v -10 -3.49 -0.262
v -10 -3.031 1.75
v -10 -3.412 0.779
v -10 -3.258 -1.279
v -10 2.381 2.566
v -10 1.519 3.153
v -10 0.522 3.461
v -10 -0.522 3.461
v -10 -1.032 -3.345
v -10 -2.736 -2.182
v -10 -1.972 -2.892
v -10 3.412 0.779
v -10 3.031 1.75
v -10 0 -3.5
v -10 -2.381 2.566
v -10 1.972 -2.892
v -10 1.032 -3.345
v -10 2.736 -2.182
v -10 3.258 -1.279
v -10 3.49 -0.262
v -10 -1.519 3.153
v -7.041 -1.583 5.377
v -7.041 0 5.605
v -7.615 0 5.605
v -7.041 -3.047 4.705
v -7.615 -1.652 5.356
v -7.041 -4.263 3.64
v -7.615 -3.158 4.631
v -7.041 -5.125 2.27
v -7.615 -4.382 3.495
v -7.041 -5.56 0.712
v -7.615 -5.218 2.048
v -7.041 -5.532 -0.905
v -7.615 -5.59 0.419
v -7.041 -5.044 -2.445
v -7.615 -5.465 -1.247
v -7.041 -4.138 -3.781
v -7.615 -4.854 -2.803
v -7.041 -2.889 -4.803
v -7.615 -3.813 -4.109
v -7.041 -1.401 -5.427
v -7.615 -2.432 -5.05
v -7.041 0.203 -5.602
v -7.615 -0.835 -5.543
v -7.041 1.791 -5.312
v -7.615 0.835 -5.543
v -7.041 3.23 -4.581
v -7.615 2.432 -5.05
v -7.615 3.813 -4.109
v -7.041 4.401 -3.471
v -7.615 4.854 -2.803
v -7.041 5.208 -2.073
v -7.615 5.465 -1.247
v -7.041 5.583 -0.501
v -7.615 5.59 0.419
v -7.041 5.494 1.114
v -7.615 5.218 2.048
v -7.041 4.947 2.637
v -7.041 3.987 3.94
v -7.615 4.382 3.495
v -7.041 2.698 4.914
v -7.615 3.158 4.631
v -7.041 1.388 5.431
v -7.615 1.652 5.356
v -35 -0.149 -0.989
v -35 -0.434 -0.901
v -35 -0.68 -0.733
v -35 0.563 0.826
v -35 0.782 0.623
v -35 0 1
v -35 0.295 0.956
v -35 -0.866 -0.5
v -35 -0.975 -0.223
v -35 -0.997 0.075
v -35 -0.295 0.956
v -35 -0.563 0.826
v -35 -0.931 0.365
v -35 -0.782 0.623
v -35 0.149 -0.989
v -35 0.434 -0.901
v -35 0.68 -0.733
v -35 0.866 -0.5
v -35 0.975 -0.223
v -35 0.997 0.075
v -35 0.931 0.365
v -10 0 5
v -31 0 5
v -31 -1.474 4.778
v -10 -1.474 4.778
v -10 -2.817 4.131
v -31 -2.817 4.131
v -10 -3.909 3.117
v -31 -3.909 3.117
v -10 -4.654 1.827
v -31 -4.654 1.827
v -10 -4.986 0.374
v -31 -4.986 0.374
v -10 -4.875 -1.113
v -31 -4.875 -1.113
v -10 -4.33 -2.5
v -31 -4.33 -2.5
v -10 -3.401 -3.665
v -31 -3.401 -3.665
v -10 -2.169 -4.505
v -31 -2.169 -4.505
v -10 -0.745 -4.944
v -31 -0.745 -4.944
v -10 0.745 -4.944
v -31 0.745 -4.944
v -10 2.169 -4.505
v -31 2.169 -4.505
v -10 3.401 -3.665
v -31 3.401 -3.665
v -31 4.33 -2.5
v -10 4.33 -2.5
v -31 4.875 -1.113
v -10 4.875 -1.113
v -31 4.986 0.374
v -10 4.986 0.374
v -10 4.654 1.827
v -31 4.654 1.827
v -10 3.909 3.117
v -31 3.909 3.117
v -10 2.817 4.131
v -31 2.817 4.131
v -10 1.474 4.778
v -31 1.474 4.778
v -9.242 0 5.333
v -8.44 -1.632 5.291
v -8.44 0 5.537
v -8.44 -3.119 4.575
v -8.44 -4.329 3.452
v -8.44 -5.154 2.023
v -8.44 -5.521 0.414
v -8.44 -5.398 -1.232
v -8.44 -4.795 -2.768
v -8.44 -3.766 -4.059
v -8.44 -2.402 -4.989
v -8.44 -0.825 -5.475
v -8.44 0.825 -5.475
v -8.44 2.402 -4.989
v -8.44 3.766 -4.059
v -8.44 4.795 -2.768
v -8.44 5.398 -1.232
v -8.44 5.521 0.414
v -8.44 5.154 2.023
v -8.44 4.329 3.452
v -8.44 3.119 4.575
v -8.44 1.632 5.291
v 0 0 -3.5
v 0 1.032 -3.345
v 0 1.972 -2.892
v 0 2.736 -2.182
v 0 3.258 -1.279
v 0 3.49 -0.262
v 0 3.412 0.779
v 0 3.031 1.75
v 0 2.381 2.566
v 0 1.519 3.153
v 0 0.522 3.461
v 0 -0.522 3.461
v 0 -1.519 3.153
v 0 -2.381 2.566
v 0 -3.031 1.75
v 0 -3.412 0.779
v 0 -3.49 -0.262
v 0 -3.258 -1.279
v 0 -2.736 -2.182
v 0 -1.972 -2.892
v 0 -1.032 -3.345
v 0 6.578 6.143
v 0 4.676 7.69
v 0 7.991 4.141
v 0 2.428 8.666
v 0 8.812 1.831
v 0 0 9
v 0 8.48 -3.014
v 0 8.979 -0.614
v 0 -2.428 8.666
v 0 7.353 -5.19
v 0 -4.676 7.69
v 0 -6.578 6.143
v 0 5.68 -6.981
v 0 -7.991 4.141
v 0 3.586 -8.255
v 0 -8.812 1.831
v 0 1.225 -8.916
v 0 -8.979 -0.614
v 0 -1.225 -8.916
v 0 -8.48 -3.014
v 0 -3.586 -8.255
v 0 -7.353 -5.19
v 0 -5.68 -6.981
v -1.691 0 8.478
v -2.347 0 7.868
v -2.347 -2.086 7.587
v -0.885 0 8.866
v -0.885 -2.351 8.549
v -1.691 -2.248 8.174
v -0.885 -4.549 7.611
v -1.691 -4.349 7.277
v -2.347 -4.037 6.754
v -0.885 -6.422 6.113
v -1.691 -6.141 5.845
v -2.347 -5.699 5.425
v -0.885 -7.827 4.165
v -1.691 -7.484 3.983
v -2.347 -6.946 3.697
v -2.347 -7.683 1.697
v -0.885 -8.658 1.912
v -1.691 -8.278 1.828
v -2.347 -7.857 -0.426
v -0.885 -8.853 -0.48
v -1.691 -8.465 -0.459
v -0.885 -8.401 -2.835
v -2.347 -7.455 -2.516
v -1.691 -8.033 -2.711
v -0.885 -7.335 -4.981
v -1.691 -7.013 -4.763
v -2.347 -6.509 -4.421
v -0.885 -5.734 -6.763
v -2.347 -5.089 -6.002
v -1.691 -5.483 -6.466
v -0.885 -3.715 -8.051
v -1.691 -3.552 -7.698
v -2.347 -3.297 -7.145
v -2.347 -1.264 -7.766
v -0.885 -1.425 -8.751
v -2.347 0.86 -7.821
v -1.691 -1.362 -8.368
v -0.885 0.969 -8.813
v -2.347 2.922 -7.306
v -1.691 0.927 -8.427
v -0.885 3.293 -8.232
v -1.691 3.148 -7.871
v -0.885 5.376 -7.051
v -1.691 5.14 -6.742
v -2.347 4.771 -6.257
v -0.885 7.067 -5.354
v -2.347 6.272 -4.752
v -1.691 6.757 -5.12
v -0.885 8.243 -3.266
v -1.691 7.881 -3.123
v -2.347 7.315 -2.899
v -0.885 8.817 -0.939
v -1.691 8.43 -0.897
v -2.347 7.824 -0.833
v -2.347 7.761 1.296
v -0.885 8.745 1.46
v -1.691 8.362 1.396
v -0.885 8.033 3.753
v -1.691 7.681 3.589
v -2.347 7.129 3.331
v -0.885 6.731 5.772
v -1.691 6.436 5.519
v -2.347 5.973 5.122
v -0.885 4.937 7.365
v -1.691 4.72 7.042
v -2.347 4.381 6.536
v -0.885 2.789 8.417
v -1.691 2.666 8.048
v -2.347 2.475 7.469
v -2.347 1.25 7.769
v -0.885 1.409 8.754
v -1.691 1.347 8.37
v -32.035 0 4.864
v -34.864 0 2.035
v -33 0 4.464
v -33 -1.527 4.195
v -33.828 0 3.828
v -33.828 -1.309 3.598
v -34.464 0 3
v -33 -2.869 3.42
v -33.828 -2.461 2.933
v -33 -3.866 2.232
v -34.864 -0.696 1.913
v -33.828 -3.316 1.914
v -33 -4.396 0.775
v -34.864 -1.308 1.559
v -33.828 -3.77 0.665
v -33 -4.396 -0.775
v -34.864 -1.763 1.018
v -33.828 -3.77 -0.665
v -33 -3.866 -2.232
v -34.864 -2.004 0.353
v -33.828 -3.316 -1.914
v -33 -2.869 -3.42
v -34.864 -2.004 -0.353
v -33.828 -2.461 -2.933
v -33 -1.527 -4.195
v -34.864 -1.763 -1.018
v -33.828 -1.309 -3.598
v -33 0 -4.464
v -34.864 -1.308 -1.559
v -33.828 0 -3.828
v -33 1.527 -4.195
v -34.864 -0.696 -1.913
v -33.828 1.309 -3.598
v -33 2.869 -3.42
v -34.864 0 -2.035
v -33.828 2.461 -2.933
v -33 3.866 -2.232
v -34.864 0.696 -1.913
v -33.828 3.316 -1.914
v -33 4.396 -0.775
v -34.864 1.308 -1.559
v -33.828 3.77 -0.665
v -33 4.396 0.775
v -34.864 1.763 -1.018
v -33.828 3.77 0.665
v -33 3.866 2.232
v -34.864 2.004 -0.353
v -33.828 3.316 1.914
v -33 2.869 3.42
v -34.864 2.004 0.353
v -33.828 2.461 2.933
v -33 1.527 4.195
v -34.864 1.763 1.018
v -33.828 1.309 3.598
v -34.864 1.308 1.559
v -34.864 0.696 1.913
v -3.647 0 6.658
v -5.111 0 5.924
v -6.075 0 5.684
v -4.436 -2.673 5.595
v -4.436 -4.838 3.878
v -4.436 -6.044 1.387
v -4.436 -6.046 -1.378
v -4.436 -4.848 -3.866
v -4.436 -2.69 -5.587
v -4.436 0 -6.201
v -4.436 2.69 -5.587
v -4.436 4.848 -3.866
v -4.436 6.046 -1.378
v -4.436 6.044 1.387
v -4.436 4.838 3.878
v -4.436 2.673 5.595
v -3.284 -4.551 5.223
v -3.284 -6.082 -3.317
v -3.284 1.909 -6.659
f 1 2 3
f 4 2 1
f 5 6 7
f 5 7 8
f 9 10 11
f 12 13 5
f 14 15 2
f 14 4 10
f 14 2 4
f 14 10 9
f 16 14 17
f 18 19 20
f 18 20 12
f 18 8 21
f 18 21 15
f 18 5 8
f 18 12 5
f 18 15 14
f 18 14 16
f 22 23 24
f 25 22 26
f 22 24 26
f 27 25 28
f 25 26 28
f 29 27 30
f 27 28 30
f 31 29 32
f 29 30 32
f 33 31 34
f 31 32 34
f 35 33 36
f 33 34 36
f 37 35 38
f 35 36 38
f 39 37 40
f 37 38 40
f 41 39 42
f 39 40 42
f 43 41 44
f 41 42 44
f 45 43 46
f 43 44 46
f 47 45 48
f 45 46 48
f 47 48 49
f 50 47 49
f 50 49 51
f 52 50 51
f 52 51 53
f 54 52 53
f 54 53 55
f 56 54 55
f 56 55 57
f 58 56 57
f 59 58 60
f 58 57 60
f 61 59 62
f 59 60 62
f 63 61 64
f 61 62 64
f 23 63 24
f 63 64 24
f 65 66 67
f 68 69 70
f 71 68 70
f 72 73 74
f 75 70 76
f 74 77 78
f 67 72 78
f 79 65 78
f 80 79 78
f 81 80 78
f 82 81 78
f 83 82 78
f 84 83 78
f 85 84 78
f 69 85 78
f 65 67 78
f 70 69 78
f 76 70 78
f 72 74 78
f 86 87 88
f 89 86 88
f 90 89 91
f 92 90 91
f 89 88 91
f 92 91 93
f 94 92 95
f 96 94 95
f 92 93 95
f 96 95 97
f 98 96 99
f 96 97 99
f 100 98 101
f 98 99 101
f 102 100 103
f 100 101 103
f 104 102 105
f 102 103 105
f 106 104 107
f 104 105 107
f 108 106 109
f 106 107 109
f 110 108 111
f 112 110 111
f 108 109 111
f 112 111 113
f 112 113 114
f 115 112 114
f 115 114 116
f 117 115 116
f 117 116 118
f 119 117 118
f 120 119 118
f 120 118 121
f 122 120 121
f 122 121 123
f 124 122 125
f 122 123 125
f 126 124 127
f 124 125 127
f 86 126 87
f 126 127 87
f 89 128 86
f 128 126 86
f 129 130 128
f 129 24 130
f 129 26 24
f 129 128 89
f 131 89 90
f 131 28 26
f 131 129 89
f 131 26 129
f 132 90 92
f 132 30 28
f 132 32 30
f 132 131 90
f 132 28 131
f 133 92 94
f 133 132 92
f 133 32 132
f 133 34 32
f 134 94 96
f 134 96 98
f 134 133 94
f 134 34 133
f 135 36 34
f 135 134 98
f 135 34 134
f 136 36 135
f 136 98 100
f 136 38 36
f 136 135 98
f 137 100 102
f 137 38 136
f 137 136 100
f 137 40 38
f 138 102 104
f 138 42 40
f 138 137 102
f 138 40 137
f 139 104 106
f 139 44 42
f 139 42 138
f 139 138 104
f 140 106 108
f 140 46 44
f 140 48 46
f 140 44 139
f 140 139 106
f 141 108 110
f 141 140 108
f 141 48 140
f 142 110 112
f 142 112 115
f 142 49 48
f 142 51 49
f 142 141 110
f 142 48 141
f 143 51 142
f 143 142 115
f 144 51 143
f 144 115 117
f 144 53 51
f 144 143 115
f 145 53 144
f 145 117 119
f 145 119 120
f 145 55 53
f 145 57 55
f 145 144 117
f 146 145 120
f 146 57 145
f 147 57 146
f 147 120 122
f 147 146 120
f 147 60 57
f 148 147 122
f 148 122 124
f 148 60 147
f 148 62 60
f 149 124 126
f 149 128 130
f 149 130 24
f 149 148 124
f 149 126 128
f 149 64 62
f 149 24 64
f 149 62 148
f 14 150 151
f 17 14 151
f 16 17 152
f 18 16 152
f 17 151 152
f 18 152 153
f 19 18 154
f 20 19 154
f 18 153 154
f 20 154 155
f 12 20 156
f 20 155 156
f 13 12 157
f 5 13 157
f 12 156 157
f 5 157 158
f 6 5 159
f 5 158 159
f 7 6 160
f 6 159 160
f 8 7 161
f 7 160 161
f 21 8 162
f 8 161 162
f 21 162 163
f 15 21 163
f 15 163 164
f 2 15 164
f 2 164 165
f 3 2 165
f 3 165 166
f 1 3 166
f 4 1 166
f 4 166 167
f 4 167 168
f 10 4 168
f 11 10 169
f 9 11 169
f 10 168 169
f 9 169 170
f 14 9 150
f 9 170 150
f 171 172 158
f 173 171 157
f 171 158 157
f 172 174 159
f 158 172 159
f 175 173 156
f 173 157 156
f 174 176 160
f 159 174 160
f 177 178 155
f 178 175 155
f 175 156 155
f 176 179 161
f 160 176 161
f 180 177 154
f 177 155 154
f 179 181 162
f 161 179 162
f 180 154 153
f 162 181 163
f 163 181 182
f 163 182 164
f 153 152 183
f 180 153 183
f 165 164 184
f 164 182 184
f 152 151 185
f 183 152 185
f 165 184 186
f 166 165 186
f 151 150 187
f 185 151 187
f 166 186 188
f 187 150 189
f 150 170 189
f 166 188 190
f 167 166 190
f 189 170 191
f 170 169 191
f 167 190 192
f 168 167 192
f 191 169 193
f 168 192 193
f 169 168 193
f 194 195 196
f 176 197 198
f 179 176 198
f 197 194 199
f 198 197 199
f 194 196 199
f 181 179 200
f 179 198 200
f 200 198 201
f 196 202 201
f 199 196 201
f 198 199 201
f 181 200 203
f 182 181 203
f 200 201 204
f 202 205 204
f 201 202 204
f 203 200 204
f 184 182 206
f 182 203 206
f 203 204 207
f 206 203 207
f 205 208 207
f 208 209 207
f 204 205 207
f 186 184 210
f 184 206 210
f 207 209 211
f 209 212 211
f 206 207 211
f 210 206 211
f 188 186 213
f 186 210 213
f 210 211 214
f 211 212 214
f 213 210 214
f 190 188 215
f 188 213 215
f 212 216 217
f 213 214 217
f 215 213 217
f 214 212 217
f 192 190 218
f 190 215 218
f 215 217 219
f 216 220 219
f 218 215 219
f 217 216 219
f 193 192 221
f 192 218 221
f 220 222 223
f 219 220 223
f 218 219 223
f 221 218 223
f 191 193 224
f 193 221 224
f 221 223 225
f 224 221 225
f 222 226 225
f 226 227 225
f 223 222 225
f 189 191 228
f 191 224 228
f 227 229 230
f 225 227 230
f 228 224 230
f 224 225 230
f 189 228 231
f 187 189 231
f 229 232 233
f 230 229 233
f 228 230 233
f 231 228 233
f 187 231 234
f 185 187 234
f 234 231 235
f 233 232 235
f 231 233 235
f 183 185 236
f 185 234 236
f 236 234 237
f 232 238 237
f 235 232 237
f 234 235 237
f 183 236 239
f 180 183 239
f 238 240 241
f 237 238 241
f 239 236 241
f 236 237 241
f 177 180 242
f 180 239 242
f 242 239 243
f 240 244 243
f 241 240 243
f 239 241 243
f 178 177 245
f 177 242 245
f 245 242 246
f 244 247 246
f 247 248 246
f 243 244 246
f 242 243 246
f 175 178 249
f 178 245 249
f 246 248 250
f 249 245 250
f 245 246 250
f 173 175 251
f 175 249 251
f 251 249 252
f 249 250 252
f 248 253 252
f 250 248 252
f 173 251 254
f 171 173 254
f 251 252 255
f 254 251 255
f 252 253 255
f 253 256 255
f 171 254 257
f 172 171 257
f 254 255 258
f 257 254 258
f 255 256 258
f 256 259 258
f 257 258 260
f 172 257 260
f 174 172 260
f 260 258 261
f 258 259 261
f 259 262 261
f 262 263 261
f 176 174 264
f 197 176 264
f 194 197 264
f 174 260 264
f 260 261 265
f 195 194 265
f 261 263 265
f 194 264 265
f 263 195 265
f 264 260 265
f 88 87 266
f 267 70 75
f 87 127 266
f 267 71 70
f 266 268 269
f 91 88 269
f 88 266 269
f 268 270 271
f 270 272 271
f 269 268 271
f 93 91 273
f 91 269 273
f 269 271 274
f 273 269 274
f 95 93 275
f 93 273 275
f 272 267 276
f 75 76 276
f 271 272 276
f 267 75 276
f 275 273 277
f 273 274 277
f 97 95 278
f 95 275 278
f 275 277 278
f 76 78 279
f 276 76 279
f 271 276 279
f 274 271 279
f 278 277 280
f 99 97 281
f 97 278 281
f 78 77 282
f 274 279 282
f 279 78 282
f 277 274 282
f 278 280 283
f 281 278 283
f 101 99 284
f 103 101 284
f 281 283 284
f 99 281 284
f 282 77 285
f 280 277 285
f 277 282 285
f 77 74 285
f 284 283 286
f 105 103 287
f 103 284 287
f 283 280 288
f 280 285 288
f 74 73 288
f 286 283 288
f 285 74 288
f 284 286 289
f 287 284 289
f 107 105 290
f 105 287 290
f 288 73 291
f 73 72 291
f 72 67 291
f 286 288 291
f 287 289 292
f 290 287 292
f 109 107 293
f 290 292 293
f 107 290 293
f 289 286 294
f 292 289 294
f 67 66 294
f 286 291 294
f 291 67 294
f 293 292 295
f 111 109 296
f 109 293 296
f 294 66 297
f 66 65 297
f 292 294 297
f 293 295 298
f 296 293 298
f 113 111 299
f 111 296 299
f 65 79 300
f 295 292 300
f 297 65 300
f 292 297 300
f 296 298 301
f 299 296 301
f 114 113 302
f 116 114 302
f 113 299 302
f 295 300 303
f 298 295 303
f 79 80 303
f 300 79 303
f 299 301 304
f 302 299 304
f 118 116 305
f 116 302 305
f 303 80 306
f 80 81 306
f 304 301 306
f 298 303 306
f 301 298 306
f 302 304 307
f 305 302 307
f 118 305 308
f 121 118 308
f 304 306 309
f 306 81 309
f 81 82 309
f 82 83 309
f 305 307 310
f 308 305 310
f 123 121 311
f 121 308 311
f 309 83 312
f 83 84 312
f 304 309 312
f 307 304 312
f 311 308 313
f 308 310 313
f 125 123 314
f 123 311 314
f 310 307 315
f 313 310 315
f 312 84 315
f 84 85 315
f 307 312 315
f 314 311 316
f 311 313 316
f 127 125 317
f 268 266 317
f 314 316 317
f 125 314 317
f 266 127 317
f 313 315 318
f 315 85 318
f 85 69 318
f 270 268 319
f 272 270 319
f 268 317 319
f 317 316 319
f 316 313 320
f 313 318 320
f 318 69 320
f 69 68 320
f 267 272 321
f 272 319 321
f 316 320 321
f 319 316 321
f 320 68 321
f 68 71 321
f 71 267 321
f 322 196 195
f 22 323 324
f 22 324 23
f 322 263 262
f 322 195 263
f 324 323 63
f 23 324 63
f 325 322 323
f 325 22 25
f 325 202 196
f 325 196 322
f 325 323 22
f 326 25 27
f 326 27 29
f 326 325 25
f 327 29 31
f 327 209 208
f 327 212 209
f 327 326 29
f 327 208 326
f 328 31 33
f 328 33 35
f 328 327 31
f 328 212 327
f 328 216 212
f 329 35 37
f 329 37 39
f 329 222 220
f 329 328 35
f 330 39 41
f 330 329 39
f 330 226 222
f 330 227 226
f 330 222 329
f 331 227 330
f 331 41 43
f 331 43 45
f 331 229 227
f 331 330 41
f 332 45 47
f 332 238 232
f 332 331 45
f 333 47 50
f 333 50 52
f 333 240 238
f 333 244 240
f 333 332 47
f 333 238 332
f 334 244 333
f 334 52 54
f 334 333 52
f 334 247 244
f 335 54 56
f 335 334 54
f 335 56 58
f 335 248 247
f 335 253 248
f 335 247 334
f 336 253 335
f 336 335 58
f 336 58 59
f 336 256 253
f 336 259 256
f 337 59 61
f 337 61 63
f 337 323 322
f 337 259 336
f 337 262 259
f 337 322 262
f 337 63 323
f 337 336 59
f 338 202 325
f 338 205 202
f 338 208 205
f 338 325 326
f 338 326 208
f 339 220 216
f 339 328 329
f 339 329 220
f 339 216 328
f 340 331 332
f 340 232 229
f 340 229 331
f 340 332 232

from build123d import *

# Parameters (mm, degrees)
SKETCH2_R          = 3.5
CUT_EXTRUDE1_DEPTH = 10
FILLET7_R          = 3
FILLET8_R          = 6
FILLET9_R          = 5
FILLET10_R         = 4


# Some blends are built 0.0001 mm under size
with BuildPart() as part:
    # Sketch1 → Revolve1 (revolve)
    with BuildSketch(Plane(origin=(0, 0, 0), x_dir=(1, 0, 0), z_dir=(0, 1, 0)), mode=Mode.PRIVATE) as revolve1_sk:
        Polygon((0, 0), (0, 9), (-3, 9), (-3, 5.60541789), (-10, 5.60541789), (-10, 5), (-35, 5), (-35, 0), align=None)
    revolve(revolve1_sk.sketch.rotate(Axis((-35, 0, 0), (1, 0, 0)), 180), axis=Axis((-35, 0, 0), (1, 0, 0)))

    # Sketch2 → Cut-Extrude1 (cut)
    with BuildSketch(Plane(origin=(0, 0, 0), x_dir=(0, 0, -1), z_dir=(1, 0, 0))):
        Circle(SKETCH2_R)
    extrude(amount=-CUT_EXTRUDE1_DEPTH, mode=Mode.SUBTRACT)

    # Fillet7
    fillet7_edges = [part.edges().sort_by_distance(p)[0] for p in [
        (-3, 0, -9),
    ]]
    fillet(fillet7_edges, radius=FILLET7_R - 0.0001)  # a hair under: the kernel refuses the full size

    # Fillet8
    fillet8_edges = [part.edges().sort_by_distance(p)[0] for p in [
        (-3, 0, -5.60541789),
    ]]
    fillet(fillet8_edges, radius=FILLET8_R)

    # Fillet9
    # the kernel refuses this fillet: 5 mm, written as the material it takes off along each edge
    with BuildSketch(Plane(origin=(-10, 0, 0), x_dir=(0, 0, 1), z_dir=(0, 1, 0))) as fillet9_piece_1:
        with BuildLine():
            CenterArc((0.60541789, 2.384879049), FILLET9_R, 331.51192705, 28.48807295)
            Line((5, 0), (5.60541789, 0))
            Line((5.60541789, 0), (5.60541789, 2.384879049))
        make_face()
    revolve(axis=Axis((-10, 0, 0), (1, 0, 0)), mode=Mode.SUBTRACT)

    # Fillet10
    fillet10_edges = [part.edges().sort_by_distance(p)[0] for p in [
        (-35, 0, -5),
    ]]
    fillet(fillet10_edges, radius=FILLET10_R)


solid = part.part
